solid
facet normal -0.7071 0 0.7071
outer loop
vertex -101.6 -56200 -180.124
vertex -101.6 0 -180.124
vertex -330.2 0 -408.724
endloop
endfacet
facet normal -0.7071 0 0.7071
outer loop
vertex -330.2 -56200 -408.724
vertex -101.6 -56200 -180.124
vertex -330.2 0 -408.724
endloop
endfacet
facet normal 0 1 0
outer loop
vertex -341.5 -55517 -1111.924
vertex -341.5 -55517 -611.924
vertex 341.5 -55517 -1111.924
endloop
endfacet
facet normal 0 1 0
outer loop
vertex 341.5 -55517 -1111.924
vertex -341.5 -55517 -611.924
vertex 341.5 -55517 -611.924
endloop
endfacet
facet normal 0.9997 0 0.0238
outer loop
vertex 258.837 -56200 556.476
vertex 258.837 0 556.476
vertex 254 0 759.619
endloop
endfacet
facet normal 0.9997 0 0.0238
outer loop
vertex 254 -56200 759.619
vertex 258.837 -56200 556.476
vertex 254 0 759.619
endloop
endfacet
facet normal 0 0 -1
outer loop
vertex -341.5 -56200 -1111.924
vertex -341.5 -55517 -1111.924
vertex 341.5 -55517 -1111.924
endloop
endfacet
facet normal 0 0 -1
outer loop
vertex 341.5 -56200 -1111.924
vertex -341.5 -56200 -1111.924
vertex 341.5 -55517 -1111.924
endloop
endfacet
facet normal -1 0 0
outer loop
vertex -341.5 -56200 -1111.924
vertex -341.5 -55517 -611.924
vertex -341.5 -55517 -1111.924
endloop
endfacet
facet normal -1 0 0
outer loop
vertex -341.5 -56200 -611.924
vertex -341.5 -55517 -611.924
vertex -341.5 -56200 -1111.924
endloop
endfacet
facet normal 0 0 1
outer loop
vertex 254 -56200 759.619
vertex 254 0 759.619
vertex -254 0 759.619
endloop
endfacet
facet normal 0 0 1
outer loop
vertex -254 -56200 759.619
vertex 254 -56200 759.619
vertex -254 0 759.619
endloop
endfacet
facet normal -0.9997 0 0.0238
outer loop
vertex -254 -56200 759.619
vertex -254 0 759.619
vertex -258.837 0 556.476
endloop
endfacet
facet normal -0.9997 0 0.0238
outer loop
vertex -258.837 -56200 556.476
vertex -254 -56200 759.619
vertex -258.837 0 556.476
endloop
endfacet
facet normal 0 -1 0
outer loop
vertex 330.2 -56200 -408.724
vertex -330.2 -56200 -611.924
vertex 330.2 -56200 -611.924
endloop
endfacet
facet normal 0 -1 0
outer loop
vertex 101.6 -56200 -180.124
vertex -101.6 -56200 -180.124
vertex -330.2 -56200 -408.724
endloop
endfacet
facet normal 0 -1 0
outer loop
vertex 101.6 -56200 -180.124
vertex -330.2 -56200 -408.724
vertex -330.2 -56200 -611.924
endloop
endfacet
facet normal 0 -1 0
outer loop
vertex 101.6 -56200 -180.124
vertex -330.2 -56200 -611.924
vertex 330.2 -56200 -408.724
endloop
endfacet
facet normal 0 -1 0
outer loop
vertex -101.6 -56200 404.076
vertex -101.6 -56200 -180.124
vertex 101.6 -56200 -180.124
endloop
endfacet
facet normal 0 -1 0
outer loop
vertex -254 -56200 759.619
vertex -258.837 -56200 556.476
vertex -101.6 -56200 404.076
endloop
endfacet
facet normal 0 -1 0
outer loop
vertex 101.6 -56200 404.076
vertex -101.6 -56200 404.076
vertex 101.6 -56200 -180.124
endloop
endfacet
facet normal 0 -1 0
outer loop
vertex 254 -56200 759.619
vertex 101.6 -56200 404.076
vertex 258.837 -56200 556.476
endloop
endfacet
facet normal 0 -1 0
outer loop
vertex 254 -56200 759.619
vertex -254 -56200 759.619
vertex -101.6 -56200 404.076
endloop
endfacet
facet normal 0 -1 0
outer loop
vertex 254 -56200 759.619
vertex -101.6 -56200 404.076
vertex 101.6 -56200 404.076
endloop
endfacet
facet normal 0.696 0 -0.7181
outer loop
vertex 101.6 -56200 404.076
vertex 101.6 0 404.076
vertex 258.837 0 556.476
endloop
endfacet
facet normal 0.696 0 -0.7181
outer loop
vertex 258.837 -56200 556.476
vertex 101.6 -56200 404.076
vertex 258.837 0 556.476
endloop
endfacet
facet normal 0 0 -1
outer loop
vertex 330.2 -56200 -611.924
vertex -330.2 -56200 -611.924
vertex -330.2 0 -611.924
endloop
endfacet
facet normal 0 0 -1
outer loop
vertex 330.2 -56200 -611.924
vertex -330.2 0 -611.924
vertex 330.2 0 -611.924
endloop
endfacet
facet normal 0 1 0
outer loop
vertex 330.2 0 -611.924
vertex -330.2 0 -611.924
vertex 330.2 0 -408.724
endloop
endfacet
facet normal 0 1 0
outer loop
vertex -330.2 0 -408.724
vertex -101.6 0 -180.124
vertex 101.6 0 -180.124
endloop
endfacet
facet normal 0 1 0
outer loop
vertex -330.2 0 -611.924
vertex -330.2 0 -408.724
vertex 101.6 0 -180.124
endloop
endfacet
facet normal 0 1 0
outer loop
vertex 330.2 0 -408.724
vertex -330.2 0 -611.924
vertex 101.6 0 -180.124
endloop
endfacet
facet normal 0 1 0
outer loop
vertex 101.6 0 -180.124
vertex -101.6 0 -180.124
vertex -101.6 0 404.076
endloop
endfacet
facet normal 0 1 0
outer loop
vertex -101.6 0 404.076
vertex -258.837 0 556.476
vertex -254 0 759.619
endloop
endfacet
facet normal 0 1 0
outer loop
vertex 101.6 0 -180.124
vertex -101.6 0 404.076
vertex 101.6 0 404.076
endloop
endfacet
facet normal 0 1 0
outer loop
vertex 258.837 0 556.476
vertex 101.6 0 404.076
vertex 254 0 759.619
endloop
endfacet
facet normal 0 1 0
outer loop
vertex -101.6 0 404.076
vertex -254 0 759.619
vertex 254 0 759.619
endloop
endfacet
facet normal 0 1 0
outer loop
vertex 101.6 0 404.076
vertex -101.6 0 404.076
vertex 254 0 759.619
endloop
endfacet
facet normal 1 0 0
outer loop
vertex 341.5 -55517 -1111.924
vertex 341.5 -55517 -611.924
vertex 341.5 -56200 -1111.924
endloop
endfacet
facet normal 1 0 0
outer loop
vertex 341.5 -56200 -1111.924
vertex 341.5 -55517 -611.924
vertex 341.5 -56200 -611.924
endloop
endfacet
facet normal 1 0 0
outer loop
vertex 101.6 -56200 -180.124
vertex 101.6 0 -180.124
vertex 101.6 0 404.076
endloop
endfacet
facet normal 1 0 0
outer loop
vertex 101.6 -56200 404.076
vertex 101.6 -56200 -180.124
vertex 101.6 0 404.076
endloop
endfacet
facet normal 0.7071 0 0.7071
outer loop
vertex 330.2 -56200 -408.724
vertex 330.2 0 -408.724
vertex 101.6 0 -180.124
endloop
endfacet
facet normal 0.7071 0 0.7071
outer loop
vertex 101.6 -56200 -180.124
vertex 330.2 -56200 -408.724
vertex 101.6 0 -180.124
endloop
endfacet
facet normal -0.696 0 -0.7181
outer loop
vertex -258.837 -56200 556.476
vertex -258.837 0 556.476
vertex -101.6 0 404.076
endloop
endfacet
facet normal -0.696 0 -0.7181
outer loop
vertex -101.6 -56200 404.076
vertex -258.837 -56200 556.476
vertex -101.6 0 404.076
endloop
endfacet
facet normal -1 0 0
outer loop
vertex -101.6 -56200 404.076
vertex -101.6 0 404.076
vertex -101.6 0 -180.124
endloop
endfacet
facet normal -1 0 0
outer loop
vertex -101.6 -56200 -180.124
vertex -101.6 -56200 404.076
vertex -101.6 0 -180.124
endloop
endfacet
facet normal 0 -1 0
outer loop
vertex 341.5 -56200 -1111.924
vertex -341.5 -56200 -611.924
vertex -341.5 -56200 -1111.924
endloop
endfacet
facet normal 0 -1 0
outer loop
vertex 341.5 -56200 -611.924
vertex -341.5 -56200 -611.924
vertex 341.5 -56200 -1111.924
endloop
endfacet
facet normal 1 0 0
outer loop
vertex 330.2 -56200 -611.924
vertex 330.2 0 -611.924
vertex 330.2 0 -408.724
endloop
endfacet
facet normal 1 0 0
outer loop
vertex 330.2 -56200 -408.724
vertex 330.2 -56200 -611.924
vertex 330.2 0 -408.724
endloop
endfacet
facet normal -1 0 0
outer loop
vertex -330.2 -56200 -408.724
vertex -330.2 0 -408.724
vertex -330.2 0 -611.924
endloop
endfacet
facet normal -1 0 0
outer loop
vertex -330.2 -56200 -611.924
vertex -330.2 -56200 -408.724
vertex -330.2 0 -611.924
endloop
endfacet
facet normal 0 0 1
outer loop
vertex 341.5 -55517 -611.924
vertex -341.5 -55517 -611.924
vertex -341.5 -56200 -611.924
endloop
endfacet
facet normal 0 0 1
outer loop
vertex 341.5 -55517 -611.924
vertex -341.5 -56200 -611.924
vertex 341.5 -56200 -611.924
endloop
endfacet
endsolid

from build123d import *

# Parameters (mm, degrees)
F1_DEPTH = 56200
F3_W     = 660.4
F3_H     = 683
F4_DEPTH = 500
F3_W_2   = 11.3
F5_DEPTH = 500
F6_DEPTH = 500


with BuildPart() as f1:
    # F0 (on Front) → F1 (new body)
    with BuildSketch(Plane.XZ):
        Polygon((254, 759.618646022), (0, 759.618646022), (-254, 759.618646022), (-258.8367380354, 556.47621824), (-101.6, 404.07621824), (-101.6, -180.12378176), (-330.2, -408.72378176), (-330.2, -611.92378176), (0, -611.92378176), (330.2, -611.92378176), (330.2, -408.72378176), (101.6, -180.12378176), (101.6, 404.07621824), (258.8367380354, 556.47621824), align=None)
    extrude(amount=F1_DEPTH)


with BuildPart() as f4:
    # F3 (on face) → F4 (new body)
    with BuildSketch(Plane(origin=(0, 0, -611.92378176), x_dir=(1, 0, 0), z_dir=(0, 0, -1))):
        with Locations((0, 55858.5)):
            Rectangle(F3_W, F3_H)
    extrude(amount=F4_DEPTH)

    # F3 (on face) → F5 (join)
    with BuildSketch(Plane(origin=(0, 0, -611.92378176), x_dir=(1, 0, 0), z_dir=(0, 0, -1))):
        with Locations((335.85, 55858.5)):
            Rectangle(F3_W_2, F3_H)
    extrude(amount=F5_DEPTH)

    # F3 (on face) → F6 (join)
    with BuildSketch(Plane(origin=(0, 0, -611.92378176), x_dir=(1, 0, 0), z_dir=(0, 0, -1))):
        with Locations((-335.85, 55858.5)):
            Rectangle(F3_W_2, F3_H)
    extrude(amount=F6_DEPTH)


solid = Compound([f1.part, f4.part])
